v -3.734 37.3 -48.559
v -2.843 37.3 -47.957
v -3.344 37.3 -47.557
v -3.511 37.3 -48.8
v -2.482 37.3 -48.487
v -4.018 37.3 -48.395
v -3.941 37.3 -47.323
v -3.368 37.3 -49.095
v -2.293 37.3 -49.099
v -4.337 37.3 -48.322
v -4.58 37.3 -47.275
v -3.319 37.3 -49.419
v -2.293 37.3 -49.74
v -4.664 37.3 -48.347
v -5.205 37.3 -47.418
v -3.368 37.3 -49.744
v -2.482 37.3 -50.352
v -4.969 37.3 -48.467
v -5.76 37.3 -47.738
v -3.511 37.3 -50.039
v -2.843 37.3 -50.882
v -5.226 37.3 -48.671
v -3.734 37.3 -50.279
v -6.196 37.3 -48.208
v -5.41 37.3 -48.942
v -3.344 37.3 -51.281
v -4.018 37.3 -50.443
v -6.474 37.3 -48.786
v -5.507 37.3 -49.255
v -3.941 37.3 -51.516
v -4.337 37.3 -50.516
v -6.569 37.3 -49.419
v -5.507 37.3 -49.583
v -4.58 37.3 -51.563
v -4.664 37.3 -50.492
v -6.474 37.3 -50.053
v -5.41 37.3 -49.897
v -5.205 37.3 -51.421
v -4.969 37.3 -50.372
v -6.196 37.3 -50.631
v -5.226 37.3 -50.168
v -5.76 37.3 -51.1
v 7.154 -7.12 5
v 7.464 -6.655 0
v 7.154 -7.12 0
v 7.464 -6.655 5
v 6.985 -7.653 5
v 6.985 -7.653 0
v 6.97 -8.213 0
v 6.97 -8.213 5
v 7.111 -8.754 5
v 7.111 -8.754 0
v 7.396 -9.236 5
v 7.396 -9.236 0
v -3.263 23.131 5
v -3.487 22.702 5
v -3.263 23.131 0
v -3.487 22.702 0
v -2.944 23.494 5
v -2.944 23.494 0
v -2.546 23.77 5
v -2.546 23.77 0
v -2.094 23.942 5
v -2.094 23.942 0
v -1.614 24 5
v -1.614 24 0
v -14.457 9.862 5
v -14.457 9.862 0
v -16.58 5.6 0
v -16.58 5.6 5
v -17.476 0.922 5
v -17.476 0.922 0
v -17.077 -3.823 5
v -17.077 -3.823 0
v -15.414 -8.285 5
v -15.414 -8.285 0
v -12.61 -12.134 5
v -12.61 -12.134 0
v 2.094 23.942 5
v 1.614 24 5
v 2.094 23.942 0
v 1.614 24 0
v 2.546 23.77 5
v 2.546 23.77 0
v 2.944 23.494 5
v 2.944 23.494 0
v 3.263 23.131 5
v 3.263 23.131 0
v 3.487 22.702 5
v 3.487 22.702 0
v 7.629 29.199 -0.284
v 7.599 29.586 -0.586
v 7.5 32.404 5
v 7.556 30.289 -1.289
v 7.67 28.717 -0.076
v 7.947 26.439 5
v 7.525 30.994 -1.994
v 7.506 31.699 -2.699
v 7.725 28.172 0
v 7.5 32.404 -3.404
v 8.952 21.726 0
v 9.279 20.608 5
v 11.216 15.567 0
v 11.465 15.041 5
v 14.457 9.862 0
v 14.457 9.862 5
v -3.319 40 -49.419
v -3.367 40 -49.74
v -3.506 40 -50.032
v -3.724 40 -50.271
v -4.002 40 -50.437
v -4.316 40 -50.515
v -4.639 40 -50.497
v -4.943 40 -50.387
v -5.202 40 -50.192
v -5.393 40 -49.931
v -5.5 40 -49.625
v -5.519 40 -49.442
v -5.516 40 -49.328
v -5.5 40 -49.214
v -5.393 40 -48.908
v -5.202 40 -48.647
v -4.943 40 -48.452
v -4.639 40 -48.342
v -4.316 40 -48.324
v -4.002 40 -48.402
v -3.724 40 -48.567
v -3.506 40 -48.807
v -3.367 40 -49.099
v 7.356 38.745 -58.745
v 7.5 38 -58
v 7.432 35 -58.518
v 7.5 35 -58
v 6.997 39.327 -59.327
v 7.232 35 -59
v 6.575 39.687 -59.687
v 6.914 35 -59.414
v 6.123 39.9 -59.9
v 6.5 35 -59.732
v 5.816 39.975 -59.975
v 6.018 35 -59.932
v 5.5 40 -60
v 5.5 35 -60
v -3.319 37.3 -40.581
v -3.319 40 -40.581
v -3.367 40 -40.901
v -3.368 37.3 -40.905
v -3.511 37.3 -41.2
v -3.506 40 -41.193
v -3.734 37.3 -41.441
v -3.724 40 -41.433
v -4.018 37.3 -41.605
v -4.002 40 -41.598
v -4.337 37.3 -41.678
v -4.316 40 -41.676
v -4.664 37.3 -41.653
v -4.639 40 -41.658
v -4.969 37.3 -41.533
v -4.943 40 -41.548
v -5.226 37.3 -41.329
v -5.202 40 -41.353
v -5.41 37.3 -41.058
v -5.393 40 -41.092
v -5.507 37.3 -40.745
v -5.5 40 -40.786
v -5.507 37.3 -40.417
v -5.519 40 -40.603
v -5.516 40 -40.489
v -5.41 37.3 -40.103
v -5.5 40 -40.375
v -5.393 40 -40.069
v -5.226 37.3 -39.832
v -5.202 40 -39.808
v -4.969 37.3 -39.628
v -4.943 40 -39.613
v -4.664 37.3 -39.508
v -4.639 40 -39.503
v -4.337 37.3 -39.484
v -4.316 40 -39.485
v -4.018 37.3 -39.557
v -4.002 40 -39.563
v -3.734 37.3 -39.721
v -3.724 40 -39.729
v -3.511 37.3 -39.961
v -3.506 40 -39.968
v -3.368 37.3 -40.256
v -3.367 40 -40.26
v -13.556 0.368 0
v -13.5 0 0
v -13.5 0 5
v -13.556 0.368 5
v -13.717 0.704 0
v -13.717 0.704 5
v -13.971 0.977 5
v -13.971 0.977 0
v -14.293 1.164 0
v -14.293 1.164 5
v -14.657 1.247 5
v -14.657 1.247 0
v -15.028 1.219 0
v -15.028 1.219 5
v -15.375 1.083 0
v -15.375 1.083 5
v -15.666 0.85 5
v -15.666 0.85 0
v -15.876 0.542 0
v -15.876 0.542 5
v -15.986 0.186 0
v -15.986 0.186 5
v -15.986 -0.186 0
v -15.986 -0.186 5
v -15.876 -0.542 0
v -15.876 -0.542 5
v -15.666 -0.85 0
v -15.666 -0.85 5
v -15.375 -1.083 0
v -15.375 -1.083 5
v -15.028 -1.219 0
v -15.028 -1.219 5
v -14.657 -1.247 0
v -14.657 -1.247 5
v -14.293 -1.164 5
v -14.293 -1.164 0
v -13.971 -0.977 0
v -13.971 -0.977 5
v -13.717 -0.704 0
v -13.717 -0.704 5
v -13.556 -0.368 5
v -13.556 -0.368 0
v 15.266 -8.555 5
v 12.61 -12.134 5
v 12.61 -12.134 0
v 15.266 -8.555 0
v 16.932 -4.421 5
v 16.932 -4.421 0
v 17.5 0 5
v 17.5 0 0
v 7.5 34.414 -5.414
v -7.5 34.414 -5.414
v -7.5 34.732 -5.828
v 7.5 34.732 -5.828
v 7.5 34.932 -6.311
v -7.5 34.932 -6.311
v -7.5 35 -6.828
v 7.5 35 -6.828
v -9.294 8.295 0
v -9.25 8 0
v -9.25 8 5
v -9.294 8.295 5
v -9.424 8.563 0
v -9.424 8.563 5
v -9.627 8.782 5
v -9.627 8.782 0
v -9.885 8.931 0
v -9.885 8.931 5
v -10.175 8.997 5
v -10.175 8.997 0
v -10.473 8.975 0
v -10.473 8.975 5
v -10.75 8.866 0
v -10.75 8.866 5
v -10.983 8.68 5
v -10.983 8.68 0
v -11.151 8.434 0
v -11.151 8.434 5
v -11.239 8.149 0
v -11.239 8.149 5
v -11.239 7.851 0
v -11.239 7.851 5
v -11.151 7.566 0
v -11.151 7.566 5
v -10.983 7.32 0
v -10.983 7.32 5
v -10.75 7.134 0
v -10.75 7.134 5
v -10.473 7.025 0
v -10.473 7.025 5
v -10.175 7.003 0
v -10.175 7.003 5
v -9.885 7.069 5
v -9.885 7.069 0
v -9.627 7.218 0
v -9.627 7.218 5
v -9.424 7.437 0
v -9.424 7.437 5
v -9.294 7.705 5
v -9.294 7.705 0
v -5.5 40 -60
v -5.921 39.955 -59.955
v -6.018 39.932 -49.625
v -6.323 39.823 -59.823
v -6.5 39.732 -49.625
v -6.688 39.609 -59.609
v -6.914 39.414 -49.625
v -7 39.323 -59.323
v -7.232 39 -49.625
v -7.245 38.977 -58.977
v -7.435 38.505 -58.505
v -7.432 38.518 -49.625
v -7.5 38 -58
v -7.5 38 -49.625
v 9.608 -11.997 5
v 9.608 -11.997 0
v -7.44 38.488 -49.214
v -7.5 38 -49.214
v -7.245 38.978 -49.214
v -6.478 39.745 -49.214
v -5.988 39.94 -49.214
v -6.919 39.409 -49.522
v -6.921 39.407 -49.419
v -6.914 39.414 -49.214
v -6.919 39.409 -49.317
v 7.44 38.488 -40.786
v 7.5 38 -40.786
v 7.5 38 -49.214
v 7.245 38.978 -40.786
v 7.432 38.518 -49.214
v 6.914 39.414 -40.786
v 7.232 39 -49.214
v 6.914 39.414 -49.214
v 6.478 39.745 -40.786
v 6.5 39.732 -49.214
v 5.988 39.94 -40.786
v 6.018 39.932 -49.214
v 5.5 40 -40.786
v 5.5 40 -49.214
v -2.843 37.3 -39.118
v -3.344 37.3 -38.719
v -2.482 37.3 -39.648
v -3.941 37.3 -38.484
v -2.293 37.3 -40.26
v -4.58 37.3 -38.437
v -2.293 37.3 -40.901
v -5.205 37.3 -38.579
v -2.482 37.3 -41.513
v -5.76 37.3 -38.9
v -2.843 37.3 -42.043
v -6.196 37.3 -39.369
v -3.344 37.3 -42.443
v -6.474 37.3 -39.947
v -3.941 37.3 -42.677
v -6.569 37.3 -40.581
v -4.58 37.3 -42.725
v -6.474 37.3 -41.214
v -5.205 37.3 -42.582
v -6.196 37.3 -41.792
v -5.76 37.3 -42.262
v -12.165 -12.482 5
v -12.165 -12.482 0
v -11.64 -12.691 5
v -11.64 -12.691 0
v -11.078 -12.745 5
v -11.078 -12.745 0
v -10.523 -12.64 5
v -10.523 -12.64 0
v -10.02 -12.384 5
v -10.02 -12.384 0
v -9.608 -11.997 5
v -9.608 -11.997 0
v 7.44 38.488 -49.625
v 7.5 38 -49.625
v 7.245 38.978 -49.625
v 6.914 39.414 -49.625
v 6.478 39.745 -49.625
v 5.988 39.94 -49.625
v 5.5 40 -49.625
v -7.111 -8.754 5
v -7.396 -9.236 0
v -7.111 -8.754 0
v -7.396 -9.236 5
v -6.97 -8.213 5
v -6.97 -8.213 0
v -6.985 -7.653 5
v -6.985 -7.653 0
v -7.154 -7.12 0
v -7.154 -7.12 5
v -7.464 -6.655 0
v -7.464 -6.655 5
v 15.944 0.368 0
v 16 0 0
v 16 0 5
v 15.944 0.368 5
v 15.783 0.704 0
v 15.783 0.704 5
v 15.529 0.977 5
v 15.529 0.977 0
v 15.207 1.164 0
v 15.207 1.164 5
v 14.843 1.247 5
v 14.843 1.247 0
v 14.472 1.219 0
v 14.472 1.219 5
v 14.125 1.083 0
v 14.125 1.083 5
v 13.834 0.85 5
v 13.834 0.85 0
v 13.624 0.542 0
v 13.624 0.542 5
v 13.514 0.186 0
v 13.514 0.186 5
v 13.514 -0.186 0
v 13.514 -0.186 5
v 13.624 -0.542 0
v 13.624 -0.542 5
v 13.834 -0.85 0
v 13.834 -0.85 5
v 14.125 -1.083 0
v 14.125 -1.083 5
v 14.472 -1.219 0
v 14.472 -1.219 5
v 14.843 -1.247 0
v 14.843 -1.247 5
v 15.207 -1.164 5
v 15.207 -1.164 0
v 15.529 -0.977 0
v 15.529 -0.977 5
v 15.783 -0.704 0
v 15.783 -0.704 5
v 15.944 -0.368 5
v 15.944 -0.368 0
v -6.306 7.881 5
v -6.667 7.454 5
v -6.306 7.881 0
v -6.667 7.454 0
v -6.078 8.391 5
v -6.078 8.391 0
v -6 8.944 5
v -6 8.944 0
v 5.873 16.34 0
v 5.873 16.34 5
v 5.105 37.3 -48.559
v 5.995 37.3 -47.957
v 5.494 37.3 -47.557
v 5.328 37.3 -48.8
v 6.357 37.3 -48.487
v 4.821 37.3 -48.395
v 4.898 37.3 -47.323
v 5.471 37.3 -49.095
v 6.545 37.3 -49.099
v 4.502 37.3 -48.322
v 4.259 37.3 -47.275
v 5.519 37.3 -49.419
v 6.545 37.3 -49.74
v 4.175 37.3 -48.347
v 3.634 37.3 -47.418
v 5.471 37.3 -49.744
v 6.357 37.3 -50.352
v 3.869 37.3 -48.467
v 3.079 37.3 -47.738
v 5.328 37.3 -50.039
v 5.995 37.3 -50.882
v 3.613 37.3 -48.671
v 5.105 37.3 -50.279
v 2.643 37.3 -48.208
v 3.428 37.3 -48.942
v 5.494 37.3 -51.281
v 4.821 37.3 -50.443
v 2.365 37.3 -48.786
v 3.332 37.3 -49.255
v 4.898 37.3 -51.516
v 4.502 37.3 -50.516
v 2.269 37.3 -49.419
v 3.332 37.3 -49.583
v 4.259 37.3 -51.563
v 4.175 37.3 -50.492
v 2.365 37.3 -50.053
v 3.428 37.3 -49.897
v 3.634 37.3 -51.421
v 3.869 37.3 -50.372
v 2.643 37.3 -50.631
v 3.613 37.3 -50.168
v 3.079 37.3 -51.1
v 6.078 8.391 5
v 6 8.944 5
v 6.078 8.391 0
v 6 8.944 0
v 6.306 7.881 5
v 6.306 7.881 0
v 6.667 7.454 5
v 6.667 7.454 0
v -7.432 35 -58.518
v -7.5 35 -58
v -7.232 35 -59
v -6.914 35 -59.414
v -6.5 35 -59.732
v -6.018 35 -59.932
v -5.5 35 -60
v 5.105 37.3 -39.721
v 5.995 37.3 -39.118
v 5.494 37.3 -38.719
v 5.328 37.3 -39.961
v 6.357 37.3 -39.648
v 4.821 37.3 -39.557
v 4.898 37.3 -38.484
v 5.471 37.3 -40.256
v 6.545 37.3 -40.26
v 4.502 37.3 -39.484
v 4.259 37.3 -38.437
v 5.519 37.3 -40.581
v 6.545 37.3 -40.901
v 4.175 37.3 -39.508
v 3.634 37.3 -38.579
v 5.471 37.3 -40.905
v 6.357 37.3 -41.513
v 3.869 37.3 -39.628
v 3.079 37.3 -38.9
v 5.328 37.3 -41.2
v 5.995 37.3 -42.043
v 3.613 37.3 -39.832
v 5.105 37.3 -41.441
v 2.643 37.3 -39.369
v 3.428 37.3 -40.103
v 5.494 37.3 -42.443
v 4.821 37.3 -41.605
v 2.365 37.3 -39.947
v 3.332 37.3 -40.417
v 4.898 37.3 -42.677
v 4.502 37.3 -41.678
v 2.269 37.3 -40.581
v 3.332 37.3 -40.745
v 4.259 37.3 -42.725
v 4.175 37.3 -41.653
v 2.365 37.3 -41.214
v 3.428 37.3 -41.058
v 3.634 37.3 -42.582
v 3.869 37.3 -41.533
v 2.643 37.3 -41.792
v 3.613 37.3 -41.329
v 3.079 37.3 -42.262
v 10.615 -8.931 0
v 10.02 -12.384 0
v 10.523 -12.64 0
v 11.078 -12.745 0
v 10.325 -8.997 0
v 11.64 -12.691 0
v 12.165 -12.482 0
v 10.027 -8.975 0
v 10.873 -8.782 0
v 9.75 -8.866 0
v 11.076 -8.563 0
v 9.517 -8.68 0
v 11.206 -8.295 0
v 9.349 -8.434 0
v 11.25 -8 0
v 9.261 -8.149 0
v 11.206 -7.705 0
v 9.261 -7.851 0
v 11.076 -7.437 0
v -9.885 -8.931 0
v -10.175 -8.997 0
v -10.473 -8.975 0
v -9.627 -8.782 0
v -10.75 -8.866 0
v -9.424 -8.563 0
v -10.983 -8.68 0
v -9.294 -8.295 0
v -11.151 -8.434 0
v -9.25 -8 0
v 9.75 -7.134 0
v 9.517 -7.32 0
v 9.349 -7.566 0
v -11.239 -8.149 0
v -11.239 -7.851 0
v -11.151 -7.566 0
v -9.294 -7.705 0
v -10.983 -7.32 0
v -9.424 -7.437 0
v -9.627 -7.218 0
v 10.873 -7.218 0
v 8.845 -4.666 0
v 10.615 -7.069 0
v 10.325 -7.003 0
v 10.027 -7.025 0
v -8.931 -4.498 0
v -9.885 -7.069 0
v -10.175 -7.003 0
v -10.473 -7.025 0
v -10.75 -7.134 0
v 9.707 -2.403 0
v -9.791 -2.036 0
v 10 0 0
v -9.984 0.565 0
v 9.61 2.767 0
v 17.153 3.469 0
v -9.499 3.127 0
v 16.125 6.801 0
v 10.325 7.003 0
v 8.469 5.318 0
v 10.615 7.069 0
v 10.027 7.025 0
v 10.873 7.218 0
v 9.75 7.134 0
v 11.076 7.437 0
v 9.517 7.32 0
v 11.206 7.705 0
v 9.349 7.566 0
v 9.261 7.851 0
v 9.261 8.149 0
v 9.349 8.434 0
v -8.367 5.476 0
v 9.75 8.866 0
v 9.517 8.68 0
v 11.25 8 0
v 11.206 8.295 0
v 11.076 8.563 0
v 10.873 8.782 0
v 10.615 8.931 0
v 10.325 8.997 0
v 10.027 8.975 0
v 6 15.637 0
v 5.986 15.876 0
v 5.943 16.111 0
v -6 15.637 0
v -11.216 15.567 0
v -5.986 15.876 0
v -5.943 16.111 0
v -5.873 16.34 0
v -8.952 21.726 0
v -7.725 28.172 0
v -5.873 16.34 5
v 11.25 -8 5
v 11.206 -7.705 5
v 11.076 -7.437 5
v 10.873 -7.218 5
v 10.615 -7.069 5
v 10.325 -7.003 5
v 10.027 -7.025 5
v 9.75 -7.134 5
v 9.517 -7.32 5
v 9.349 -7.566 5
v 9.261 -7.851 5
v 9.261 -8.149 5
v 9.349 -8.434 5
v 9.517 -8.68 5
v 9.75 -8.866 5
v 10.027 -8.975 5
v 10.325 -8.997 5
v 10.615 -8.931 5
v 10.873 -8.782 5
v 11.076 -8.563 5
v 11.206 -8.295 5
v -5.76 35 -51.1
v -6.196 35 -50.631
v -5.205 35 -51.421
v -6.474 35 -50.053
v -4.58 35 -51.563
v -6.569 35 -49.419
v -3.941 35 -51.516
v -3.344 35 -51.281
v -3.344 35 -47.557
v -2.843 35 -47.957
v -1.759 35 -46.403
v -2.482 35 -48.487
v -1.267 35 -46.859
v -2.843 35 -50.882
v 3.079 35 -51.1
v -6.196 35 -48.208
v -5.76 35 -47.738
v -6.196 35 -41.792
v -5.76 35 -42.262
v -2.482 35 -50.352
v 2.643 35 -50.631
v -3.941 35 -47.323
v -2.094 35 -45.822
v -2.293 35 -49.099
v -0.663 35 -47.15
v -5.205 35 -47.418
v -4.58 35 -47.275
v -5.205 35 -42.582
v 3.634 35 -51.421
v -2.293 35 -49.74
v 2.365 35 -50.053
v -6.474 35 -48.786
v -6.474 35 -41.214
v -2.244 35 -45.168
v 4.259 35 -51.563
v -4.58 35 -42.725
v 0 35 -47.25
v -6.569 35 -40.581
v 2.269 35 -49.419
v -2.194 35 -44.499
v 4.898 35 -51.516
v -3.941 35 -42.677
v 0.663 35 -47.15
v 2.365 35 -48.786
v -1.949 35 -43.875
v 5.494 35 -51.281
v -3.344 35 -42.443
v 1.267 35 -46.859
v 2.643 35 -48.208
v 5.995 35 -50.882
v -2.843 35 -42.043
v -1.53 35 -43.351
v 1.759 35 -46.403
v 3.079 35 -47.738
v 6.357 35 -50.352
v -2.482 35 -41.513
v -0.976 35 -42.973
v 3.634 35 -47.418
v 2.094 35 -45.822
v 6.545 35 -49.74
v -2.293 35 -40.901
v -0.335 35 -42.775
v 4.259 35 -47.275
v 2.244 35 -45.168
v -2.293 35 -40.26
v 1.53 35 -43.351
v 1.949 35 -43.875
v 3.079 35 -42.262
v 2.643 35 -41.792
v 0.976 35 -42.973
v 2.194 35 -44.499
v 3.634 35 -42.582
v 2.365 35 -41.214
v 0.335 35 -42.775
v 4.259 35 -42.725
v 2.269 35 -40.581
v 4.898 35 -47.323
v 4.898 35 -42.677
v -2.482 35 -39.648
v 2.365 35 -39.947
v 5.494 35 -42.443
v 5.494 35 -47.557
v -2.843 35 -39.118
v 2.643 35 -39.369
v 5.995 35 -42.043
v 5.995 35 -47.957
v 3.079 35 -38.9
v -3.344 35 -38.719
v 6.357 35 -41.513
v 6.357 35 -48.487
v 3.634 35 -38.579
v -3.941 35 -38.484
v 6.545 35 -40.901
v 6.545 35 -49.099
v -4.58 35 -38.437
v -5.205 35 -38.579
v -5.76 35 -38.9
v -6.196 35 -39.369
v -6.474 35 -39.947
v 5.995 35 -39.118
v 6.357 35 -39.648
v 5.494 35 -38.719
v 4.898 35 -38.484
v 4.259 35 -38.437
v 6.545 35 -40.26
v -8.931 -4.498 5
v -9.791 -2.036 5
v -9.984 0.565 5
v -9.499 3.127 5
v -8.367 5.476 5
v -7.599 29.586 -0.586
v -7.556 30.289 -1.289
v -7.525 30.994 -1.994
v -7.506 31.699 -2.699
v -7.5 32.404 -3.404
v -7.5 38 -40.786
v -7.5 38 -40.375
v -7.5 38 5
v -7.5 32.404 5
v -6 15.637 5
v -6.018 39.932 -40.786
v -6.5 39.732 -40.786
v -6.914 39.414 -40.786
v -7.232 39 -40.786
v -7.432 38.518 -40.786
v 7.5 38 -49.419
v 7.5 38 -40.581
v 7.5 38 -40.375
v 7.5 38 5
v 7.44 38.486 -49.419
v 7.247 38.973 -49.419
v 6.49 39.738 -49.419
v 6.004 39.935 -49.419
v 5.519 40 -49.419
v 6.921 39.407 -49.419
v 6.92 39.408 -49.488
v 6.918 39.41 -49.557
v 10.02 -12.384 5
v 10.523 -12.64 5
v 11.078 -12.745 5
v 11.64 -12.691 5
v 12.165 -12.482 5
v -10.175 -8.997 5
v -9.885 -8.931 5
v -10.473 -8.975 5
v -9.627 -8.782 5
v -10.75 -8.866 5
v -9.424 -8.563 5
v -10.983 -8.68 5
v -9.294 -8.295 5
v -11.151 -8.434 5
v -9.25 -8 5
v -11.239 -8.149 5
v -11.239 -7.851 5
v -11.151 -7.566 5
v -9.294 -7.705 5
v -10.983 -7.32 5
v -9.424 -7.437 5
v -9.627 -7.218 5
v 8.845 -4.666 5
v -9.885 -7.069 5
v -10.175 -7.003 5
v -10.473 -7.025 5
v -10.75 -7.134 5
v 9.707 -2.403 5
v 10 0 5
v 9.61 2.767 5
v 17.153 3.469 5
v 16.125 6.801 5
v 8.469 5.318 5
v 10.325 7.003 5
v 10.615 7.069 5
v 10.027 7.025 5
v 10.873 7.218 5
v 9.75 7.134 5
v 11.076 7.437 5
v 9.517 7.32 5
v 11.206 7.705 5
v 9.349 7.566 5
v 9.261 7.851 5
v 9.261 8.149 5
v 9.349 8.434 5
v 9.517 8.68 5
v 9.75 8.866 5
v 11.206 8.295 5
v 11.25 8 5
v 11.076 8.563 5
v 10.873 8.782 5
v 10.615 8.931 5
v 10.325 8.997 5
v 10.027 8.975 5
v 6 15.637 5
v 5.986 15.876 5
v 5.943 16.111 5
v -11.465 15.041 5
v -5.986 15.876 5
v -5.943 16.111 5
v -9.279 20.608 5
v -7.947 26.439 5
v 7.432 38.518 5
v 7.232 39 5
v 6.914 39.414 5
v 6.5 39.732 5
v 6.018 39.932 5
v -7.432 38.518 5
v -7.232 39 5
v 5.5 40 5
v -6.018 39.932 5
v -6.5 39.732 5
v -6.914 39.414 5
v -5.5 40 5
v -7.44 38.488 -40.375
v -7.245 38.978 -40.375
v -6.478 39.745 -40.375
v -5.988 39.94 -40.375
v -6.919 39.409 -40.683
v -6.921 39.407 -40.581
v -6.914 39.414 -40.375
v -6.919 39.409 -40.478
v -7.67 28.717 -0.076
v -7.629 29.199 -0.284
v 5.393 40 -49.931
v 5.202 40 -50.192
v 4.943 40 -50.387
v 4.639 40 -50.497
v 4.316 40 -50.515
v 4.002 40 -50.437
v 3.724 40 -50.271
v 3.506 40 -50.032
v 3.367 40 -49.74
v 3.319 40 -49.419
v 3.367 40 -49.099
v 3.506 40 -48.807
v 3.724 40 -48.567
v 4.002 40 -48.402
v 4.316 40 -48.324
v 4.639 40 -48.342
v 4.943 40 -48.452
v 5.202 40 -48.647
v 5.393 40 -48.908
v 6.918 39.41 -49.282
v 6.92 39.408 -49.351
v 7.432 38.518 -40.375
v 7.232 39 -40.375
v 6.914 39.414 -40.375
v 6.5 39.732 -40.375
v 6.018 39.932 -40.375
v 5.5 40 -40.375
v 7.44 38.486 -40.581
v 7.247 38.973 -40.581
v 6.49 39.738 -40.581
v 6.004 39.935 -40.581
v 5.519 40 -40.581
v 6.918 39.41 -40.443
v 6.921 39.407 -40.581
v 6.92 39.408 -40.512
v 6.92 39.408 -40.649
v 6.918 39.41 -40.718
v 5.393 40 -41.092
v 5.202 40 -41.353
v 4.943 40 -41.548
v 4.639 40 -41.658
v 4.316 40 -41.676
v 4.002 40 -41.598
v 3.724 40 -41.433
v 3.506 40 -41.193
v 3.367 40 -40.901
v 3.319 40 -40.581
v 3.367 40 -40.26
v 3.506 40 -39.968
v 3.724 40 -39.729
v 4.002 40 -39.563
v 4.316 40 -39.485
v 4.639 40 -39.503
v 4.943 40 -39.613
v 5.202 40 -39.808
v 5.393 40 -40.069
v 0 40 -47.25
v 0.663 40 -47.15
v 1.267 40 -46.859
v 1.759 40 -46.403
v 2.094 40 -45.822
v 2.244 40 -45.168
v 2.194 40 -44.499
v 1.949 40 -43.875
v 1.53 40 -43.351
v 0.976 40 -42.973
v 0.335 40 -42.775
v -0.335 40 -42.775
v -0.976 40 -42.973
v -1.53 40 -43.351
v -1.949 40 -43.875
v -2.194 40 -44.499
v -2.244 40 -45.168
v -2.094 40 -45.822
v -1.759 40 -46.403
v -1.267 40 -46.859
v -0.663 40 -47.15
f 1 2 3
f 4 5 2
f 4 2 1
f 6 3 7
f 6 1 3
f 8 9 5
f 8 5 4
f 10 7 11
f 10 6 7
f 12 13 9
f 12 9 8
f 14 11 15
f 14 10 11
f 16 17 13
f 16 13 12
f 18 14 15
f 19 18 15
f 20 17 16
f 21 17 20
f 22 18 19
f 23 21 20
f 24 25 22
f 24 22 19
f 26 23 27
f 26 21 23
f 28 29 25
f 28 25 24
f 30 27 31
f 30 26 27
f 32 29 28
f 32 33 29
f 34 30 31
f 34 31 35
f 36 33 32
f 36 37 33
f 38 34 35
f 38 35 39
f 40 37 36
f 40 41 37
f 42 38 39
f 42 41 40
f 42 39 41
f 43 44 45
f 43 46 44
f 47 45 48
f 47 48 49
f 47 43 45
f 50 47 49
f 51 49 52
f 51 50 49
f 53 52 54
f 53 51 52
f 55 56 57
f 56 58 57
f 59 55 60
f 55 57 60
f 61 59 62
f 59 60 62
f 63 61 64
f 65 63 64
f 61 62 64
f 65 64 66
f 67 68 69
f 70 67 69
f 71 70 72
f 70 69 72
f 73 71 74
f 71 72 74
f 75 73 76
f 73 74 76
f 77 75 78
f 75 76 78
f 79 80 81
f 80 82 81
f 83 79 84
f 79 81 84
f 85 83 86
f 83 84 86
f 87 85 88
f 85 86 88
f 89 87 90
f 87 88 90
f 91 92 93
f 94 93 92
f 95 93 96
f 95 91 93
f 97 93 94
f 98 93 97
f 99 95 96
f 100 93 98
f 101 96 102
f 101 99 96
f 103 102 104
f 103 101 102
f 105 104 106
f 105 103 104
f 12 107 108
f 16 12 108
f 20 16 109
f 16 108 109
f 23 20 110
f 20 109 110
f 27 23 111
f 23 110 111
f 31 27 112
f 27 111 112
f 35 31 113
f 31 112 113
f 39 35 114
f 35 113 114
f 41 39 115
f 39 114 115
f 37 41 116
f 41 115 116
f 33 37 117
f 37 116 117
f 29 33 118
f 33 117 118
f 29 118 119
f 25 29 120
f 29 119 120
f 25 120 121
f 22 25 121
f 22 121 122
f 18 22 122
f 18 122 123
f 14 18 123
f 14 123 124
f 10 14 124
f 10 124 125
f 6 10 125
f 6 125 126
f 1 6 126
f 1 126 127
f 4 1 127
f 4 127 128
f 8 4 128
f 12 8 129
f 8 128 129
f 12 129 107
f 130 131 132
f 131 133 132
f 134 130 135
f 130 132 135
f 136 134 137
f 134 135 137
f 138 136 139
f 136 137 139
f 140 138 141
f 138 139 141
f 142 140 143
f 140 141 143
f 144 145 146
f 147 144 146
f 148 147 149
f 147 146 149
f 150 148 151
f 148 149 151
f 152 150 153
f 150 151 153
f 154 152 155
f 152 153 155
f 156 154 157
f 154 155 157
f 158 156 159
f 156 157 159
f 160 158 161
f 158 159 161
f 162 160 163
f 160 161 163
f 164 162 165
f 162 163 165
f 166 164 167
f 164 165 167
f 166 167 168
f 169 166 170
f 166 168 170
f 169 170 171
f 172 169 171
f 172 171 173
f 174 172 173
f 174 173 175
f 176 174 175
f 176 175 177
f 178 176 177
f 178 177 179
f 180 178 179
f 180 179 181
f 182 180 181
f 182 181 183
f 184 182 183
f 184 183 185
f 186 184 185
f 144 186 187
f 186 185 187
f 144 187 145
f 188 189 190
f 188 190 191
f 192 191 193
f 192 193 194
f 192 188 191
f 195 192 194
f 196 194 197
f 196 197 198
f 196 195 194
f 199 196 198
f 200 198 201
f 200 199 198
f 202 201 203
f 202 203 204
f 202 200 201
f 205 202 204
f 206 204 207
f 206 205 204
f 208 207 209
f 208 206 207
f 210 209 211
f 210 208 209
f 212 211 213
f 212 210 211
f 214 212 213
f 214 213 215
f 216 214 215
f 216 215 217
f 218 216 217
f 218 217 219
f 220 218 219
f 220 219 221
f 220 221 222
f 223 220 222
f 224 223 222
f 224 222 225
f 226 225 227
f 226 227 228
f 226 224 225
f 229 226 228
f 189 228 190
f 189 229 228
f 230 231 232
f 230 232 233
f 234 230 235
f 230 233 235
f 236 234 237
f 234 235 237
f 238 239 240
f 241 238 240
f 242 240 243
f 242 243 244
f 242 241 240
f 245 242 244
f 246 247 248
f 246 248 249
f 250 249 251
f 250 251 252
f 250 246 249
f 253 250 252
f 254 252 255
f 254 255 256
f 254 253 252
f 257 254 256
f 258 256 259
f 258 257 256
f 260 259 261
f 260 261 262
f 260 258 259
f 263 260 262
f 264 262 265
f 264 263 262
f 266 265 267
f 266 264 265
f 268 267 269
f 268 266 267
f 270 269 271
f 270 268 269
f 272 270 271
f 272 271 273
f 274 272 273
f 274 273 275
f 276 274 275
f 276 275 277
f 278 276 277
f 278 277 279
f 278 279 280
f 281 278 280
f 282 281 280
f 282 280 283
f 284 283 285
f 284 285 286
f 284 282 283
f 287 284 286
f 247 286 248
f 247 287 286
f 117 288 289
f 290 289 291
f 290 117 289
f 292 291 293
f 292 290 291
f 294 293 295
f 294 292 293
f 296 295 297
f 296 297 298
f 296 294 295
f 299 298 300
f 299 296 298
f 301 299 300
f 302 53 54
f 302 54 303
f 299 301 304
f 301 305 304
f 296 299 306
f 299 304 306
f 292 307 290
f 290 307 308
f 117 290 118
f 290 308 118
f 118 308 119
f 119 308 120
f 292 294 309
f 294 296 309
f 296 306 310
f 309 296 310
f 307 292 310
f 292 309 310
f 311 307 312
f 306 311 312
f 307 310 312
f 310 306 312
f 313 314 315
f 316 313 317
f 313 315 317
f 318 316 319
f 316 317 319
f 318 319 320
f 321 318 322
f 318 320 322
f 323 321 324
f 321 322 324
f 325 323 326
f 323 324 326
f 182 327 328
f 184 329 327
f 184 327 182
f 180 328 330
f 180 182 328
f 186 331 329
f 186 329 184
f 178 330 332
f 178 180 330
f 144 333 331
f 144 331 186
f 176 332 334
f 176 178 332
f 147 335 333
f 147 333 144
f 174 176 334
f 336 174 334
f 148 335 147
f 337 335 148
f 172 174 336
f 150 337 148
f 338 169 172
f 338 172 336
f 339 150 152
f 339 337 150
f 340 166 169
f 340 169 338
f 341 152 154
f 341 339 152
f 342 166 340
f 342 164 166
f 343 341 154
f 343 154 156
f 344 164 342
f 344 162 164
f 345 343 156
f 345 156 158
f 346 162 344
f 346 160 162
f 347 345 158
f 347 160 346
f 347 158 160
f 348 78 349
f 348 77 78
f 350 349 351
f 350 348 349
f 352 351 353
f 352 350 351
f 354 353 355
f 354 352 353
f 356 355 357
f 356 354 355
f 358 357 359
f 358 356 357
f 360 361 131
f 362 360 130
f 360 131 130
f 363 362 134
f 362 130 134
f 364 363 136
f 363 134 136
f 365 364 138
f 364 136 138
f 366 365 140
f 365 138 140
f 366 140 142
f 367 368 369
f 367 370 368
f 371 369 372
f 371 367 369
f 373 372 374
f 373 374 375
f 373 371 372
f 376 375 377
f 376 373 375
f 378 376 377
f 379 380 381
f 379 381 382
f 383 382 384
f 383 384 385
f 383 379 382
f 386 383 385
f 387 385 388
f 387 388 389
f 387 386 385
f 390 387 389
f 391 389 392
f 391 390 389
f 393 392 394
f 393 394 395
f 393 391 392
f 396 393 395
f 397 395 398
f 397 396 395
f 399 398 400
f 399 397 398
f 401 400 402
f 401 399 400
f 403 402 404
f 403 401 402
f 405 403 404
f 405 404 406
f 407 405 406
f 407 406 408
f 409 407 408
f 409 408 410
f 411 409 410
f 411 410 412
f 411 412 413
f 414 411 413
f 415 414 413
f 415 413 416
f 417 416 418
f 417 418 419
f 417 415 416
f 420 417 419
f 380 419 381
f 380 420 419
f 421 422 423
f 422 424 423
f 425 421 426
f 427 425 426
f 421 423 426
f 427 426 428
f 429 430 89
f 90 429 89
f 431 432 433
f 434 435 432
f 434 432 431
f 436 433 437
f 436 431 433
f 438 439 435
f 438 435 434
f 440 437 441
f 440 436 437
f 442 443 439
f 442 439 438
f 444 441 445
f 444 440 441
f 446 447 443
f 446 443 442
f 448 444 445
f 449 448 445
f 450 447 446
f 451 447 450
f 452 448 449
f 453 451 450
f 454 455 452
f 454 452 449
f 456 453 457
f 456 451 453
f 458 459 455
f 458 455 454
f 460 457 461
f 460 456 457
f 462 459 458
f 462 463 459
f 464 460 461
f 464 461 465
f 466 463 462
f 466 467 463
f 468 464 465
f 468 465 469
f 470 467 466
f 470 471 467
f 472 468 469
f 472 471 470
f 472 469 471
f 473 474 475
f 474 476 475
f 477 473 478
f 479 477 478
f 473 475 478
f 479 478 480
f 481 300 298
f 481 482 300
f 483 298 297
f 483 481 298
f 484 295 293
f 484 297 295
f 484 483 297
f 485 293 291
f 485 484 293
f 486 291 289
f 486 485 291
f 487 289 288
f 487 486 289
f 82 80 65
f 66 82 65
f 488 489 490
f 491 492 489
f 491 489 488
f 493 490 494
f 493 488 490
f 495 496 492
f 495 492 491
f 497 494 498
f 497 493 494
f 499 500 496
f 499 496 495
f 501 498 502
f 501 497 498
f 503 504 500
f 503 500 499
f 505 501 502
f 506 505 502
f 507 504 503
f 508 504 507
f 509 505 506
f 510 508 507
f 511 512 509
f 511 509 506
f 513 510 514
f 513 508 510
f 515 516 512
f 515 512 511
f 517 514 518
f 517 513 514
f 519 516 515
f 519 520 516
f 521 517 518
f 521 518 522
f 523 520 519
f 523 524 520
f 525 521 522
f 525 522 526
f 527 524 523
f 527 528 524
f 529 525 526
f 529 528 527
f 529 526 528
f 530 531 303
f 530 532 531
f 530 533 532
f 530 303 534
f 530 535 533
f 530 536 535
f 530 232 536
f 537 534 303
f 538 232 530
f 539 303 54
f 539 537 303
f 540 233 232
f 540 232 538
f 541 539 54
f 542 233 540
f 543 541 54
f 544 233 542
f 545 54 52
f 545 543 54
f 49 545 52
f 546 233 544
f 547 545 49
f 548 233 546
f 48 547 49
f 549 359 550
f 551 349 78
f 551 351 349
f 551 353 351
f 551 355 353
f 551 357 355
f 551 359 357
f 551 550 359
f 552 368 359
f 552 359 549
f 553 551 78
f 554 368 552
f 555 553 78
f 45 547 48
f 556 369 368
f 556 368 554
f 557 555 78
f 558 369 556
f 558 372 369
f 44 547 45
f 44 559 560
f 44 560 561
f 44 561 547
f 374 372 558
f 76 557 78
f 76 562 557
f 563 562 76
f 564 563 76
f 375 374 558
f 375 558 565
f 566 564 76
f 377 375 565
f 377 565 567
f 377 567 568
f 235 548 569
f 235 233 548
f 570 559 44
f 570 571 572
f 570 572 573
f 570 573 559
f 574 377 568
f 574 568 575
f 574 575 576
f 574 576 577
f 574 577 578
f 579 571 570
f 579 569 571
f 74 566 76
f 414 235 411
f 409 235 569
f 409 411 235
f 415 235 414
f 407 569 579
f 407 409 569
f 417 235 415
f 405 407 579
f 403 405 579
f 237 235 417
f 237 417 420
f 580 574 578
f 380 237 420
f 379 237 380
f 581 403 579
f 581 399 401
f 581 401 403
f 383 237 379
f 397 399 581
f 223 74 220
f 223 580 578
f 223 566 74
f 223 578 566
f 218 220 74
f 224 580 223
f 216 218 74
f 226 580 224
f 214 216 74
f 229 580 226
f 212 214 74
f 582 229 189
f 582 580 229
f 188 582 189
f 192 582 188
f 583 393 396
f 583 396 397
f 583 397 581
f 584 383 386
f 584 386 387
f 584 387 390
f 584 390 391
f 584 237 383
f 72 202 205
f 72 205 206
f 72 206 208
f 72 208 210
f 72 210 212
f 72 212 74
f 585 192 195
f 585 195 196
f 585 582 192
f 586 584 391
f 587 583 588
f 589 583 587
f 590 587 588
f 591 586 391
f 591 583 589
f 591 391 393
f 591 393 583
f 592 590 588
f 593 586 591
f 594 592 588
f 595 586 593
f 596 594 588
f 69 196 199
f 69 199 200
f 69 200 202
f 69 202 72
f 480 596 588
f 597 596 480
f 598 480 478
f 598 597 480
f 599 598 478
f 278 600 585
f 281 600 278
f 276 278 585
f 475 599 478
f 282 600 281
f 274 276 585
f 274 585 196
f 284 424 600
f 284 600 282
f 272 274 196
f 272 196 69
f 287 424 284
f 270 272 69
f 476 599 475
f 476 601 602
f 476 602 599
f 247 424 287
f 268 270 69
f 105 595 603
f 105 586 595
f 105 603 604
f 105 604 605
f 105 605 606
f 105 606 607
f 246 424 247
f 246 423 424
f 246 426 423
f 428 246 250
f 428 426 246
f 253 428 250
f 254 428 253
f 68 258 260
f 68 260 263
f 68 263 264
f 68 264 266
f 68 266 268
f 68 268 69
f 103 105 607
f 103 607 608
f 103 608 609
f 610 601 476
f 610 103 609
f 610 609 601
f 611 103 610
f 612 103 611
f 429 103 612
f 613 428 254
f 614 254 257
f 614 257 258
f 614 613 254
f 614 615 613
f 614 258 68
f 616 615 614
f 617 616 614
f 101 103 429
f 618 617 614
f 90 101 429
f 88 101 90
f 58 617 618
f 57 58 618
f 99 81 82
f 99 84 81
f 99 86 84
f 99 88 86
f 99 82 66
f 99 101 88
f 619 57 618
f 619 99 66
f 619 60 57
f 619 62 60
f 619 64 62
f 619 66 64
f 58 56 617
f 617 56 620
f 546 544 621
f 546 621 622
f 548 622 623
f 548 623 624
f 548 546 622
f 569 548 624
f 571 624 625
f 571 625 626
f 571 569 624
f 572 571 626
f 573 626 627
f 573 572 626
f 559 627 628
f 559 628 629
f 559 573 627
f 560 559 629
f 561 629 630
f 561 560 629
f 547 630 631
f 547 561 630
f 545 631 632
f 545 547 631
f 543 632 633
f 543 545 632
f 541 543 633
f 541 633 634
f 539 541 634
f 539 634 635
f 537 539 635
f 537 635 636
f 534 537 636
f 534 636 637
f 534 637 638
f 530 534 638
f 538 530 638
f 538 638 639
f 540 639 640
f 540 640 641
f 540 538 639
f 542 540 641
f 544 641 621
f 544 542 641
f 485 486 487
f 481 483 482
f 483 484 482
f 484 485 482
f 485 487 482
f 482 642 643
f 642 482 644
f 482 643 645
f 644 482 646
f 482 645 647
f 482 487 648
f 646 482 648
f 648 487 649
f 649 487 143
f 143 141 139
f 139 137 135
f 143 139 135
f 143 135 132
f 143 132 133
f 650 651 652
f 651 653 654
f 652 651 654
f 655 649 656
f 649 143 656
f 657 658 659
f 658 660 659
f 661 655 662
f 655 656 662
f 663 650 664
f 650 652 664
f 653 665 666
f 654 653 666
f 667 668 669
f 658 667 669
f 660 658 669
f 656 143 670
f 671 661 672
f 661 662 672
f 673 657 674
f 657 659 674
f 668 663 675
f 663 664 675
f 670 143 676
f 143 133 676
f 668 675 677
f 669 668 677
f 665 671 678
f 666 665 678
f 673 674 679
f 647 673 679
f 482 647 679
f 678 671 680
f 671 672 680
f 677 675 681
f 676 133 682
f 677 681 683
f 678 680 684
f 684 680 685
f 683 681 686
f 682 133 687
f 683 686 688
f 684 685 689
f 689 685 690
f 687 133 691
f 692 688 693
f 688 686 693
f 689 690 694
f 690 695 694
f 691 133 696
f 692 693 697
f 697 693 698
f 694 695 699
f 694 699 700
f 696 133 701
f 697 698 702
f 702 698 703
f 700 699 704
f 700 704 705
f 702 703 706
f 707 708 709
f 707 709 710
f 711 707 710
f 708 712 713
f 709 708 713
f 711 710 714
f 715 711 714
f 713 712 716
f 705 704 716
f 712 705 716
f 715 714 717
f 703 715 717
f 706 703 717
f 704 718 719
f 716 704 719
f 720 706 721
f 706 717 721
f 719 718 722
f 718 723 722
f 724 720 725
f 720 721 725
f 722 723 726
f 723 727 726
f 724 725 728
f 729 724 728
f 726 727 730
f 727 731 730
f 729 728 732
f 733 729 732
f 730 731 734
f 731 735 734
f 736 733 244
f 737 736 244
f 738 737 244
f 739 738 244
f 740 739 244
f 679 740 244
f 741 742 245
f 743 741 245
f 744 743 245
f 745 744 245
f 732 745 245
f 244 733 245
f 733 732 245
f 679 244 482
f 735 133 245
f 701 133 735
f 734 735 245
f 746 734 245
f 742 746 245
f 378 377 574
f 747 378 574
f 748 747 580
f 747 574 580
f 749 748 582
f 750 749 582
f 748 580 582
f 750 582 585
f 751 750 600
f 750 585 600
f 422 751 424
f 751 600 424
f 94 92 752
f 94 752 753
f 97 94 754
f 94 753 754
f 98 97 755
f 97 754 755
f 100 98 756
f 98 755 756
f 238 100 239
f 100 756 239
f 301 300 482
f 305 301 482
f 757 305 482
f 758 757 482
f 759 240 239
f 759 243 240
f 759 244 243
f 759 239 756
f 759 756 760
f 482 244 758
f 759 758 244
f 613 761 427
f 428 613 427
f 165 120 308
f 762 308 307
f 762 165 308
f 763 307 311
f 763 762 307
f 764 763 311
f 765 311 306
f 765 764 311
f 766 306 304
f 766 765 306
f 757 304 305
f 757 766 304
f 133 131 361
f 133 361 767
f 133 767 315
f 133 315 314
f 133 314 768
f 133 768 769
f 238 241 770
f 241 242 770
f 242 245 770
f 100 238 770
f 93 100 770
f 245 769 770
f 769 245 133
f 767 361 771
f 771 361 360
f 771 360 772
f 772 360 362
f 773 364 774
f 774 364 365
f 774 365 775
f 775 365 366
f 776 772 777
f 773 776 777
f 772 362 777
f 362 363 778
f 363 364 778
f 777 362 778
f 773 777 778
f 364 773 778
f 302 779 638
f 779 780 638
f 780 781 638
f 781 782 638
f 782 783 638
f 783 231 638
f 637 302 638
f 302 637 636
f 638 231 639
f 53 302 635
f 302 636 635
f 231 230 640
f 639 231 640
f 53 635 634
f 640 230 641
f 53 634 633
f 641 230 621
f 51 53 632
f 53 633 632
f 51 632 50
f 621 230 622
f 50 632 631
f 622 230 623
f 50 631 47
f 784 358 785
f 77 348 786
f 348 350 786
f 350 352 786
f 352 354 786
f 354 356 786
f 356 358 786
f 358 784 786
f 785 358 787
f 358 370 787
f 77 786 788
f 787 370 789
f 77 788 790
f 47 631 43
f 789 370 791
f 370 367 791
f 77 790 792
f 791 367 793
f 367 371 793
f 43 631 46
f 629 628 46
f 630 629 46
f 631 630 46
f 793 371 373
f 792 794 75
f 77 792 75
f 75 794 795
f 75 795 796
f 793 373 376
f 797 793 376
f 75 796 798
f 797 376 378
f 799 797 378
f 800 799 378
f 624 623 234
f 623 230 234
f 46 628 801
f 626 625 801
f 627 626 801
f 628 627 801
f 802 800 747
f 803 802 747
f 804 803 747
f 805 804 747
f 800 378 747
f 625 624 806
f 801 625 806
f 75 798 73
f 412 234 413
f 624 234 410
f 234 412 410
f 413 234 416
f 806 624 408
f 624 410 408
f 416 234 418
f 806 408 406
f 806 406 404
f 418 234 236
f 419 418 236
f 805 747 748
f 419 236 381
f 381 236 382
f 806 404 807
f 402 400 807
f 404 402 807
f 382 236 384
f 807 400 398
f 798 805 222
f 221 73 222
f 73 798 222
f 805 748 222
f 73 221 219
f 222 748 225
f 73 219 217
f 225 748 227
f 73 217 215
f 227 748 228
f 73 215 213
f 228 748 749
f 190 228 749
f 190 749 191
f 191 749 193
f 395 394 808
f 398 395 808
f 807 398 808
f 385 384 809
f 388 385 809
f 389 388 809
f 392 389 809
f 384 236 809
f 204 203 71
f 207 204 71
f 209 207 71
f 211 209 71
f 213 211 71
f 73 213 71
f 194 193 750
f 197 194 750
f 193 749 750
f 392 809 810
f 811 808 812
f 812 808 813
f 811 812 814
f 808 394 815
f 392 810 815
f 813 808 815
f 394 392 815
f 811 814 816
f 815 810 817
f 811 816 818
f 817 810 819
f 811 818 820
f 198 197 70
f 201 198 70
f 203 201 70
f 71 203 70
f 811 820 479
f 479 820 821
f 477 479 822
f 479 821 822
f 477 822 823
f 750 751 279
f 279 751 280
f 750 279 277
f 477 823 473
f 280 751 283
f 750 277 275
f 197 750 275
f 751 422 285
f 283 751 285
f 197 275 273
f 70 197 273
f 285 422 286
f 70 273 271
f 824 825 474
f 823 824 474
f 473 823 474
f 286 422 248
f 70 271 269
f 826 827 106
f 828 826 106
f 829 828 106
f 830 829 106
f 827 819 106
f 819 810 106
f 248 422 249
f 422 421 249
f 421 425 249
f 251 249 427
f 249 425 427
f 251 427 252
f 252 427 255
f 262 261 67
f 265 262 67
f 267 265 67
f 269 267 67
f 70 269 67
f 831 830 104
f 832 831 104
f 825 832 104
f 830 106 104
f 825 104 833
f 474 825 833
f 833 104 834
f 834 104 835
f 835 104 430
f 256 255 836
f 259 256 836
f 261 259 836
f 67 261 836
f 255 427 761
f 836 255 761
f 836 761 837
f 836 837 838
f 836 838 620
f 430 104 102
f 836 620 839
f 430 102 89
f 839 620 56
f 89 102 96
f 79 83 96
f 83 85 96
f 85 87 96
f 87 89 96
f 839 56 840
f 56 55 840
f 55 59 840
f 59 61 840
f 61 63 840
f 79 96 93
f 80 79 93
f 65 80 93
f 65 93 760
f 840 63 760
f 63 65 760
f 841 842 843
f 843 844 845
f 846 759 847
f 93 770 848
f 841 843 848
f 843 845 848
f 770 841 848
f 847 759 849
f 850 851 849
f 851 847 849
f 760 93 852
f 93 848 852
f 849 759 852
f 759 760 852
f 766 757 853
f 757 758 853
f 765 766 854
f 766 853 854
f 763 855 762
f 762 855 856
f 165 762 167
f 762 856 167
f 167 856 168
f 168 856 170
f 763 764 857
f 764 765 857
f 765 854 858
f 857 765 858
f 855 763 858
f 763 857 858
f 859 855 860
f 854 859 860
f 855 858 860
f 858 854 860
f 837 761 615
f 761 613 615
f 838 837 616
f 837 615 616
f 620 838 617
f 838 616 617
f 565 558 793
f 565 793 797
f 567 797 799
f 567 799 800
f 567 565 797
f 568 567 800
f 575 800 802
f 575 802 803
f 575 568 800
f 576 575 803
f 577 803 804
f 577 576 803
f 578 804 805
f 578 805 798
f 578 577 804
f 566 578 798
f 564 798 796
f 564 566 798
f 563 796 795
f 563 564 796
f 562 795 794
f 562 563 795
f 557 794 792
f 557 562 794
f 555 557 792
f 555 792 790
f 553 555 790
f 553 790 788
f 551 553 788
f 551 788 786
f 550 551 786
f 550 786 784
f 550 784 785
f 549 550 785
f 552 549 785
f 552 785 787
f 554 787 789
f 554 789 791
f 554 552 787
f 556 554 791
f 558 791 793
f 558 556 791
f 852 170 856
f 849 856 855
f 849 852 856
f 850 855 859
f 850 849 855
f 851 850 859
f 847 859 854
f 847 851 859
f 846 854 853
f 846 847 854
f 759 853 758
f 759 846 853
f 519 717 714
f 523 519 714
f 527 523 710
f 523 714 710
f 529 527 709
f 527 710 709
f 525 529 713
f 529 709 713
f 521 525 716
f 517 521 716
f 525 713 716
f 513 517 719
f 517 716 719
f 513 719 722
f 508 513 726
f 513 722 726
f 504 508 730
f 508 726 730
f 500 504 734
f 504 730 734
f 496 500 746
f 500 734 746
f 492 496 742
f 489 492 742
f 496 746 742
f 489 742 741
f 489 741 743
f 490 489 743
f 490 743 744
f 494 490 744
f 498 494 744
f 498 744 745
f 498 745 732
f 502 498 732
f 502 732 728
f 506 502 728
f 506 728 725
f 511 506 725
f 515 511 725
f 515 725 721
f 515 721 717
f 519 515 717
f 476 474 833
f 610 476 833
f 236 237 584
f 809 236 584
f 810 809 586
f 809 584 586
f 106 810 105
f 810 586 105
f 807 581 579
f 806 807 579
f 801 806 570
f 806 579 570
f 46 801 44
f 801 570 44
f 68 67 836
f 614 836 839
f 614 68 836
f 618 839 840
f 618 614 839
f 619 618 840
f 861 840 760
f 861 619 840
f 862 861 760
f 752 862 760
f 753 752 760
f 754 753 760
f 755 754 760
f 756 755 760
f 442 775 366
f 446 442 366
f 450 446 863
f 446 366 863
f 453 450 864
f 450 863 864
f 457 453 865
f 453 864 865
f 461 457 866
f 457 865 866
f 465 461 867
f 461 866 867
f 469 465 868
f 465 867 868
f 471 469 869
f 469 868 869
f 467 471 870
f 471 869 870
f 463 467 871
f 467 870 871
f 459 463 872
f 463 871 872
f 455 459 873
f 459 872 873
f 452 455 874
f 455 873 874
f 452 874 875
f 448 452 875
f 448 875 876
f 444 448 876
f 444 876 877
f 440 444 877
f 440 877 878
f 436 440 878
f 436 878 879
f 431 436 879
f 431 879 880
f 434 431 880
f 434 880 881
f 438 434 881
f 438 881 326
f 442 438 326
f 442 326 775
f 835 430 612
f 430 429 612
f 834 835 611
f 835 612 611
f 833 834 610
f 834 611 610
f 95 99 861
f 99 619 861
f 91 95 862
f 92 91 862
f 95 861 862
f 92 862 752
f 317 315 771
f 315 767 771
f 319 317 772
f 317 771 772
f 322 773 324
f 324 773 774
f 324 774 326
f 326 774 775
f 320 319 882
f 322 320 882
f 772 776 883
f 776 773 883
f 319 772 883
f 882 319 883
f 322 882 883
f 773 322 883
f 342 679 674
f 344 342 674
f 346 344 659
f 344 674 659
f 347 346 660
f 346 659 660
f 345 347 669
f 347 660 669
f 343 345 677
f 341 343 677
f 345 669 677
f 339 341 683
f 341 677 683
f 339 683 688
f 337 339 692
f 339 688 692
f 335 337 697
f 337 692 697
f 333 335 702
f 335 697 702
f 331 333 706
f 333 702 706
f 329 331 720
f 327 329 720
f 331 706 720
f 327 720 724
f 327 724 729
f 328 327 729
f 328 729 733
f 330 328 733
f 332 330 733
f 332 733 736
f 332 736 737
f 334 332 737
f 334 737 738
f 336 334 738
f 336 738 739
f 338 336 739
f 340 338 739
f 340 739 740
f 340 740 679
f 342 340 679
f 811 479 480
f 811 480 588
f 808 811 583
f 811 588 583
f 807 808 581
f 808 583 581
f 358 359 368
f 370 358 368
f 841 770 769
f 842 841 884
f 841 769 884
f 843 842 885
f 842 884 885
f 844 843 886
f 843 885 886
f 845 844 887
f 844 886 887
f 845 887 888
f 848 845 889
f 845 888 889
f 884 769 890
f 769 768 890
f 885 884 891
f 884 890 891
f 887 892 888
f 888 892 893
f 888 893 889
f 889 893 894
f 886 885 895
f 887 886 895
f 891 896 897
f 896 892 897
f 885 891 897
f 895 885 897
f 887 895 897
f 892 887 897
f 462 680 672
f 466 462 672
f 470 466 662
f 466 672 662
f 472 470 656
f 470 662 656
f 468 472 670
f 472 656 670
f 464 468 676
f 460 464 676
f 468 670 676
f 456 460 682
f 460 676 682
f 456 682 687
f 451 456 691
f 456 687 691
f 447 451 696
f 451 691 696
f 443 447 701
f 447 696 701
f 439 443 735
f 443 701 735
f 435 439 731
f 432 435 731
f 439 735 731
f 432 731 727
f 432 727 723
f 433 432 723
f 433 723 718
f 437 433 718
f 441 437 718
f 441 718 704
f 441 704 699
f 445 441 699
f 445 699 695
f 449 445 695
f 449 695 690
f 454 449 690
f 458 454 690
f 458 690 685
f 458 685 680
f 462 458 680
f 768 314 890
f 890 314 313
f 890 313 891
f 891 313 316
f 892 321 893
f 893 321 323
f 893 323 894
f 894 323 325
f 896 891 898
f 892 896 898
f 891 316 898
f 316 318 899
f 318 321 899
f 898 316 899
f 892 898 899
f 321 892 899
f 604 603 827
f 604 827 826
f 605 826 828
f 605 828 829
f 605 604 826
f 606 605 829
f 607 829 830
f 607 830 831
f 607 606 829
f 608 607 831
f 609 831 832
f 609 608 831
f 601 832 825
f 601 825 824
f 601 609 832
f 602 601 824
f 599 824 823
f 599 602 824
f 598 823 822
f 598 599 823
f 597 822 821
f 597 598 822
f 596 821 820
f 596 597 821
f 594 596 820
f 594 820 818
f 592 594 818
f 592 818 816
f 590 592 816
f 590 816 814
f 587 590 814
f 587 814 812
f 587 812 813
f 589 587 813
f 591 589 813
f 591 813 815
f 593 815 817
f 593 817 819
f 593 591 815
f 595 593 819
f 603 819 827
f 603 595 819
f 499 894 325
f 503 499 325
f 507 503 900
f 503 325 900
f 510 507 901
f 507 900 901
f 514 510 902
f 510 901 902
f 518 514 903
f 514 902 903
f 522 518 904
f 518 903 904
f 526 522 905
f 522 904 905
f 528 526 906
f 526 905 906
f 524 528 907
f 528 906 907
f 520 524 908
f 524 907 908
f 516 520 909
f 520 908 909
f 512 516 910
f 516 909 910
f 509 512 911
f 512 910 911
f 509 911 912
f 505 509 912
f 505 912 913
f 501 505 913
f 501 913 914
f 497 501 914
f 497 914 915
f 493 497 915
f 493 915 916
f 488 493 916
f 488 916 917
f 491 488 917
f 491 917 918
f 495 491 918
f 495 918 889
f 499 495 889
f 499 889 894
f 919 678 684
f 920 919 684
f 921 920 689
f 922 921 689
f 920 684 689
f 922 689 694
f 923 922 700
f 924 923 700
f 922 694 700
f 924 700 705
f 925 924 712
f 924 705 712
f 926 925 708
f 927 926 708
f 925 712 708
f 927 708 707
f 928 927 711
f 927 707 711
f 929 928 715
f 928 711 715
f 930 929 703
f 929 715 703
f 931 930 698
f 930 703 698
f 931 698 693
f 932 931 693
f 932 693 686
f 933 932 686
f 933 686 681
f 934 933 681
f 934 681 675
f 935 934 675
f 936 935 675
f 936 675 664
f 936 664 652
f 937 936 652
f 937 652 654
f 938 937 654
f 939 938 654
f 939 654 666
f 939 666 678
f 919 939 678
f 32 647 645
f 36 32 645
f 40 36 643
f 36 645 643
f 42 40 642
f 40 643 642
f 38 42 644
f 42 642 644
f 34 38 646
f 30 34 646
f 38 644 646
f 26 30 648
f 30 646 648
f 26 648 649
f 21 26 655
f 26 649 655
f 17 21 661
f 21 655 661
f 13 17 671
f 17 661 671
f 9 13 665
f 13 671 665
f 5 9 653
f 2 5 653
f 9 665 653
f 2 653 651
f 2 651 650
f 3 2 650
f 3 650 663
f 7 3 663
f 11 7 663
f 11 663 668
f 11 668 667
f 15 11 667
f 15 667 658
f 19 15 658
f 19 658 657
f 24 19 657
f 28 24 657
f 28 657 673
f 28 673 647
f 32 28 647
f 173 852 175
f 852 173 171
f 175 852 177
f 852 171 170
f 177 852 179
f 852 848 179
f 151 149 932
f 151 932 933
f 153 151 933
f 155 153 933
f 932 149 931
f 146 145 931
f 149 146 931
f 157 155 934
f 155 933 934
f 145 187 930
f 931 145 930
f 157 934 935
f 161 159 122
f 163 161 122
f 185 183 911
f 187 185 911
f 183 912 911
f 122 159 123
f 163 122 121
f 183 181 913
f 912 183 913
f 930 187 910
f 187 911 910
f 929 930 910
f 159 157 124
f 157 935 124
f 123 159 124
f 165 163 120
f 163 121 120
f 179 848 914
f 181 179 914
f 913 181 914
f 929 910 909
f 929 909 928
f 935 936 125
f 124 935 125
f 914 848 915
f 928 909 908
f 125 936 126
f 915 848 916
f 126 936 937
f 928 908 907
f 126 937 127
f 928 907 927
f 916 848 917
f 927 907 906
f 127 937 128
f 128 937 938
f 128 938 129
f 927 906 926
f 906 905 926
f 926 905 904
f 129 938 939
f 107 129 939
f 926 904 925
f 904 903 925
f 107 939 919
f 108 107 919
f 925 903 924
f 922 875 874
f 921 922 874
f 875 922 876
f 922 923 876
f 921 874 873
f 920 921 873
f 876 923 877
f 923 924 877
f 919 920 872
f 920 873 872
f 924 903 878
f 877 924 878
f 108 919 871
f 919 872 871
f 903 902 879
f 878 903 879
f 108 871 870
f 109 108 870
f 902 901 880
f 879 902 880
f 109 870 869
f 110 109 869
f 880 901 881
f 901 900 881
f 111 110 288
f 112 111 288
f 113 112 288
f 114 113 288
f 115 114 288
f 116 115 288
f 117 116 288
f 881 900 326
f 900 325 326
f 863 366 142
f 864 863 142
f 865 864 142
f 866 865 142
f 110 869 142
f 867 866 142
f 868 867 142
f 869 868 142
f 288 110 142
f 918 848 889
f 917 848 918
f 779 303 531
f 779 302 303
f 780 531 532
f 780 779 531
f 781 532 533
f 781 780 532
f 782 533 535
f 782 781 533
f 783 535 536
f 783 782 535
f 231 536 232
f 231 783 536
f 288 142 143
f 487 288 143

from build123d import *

# Parameters (mm, degrees)
SKETCH_1_R                   = 1
SKETCH_1_R_2                 = 1.25
EXTRUDE_1_DEPTH              = 5
EXTRUDE_2_DEPTH              = 7.5
SKETCH_5_R                   = 2.25
CUT_EXTRUDE_1_DEPTH          = 15
FILLET_2_R                   = 40
HOLE_WIZARD_M2_1_D           = 2.2
HOLE_WIZARD_M2_1_CBORE_D     = 4.3
HOLE_WIZARD_M2_1_CBORE_DEPTH = 2.3
CUT_EXTRUDE_2_DEPTH          = 79.302298817
FILLET_1_R                   = 2


with BuildPart() as part:
    # 草图1 → 凸台-拉伸1 (new body)
    # profile 1 of 2: a face of its own
    with BuildSketch(Plane.XY):
        with BuildLine():
            ThreePointArc((7.5, 15.811388301), (0, 17.5), (-7.5, 15.811388301))
            ThreePointArc((-7.5, 15.811388301), (-17.382056071, 2.028331029), (-10.939015625, -13.659719512))
            Line((-10.939015625, -13.659719512), (-6.250866071, -7.805554007))
            ThreePointArc((-6.250866071, -7.805554007), (-4.329626963, 9.01411839), (10, 0))
            ThreePointArc((10, 0), (9.01411839, -4.329626963), (6.250866071, -7.805554007))
            Line((6.250866071, -7.805554007), (10.939015625, -13.659719512))
            ThreePointArc((10.939015625, -13.659719512), (15.774707183, -7.576847186), (17.5, 0))
            ThreePointArc((17.5, 0), (14.790199458, 9.354143467), (7.5, 15.811388301))
        make_face()
        with Locations((-10.25, -8)):
            Circle(SKETCH_1_R, mode=Mode.SUBTRACT)
        with Locations((-14.75, 0)):
            Circle(SKETCH_1_R_2, mode=Mode.SUBTRACT)
        with Locations((-10.25, 8)):
            Circle(SKETCH_1_R, mode=Mode.SUBTRACT)
        with Locations((10.25, -8)):
            Circle(SKETCH_1_R, mode=Mode.SUBTRACT)
        with Locations((14.75, 0)):
            Circle(SKETCH_1_R_2, mode=Mode.SUBTRACT)
        with Locations((10.25, 8)):
            Circle(SKETCH_1_R, mode=Mode.SUBTRACT)
    # profile 2 of 2: a face of its own
    with BuildSketch(Plane.XY):
        with BuildLine():
            Line((-7.5, 40), (-7.5, 15.811388301))
            ThreePointArc((-7.5, 15.811388301), (0, 17.5), (7.5, 15.811388301))
            Line((7.5, 15.811388301), (7.5, 40))
            Line((7.5, 40), (-7.5, 40))
        make_face()
    extrude(amount=EXTRUDE_1_DEPTH)

    # 草图3 → 凸台-拉伸2 (add, symmetric)
    with BuildSketch(Plane(origin=(0, 0, 0), x_dir=(0, 0, -1), z_dir=(1, 0, 0))):
        Polygon((0, 40), (60, 40), (60, 35), (6, 35), (0, 29), align=None)
    extrude(amount=EXTRUDE_2_DEPTH, both=True)

    # 草图5 → 切除-拉伸1 (cut)
    with BuildSketch(Plane.XZ.offset(-35)):
        with Locations(Location((0, -45, 0), (0, 0, 270))):
            Circle(SKETCH_5_R)
    extrude(amount=-CUT_EXTRUDE_1_DEPTH, mode=Mode.SUBTRACT)

    # 圆角2
    # the kernel refuses this fillet: 40 mm, written as the material it adds along each edge
    with BuildSketch(Plane(origin=(-7.5, 15.811388301, -41.480787978), x_dir=(-0.759976311594863, -0.6499507718394276, 0), z_dir=(0, 0, 1))) as fillet_2_piece_1_section:
        with BuildLine():
            CenterArc((19.614864399, -38.607797373), FILLET_2_R, 105.160956859, 34.301152757)
            Line((-10.784188065, -12.6097665), (0, 0))
            ThreePointArc((0, 0), (4.576801693, -0.609088649), (9.153603386, 0))
        make_face()
    fillet_2_piece_1 = extrude(amount=46.480787978, mode=Mode.PRIVATE)
    fillet_2_piece_1 = split(fillet_2_piece_1, bisect_by=Plane(origin=(-7.11257259, 31.242526898, 0), z_dir=(0, 0, -1)), keep=Keep.TOP, mode=Mode.PRIVATE)
    fillet_2_piece_1 = split(fillet_2_piece_1, bisect_by=Plane(origin=(-7.11257259, 30.681895174, -1.681895174), z_dir=(0, 0.7071067811865467, 0.7071067811865486)), keep=Keep.TOP, mode=Mode.PRIVATE)
    add(fillet_2_piece_1)
    with BuildSketch(Plane(origin=(-7.5, 15.811388301, 0), x_dir=(-0.7599763115948637, -0.6499507718394266, 0), z_dir=(0, 0, 1))) as fillet_2_piece_2_section:
        with BuildLine():
            CenterArc((19.614864399, -38.607797373), FILLET_2_R, 105.160956859, 34.301152757)
            Line((-10.784188065, -12.6097665), (0, 0))
            ThreePointArc((0, 0), (4.576801693, -0.609088649), (9.153603386, 0))
        make_face()
    fillet_2_piece_2 = extrude(amount=5, mode=Mode.PRIVATE)
    fillet_2_piece_2 = split(fillet_2_piece_2, bisect_by=Plane(origin=(-9.04323472, 22.224032405, 6.775967595), z_dir=(0, -0.7071067811865467, -0.7071067811865486)), keep=Keep.TOP, mode=Mode.PRIVATE)
    add(fillet_2_piece_2)
    with BuildSketch(Plane(origin=(-7.5, 15.811388301, 0), x_dir=(-0.7599763115948637, -0.6499507718394266, 0), z_dir=(0, 0, 1))) as fillet_2_piece_3_section:
        with BuildLine():
            CenterArc((19.614864399, -38.607797373), FILLET_2_R, 105.160956859, 34.301152757)
            Line((-10.784188065, -12.6097665), (0, 0))
            ThreePointArc((0, 0), (4.576801693, -0.609088649), (9.153603386, 0))
        make_face()
    fillet_2_piece_3 = extrude(amount=5, mode=Mode.PRIVATE)
    fillet_2_piece_3 = split(fillet_2_piece_3, bisect_by=Plane(origin=(-7.203009065, 27.482958496, 1.517041504), z_dir=(0, 0.7071067811865467, 0.7071067811865486)), keep=Keep.TOP, mode=Mode.PRIVATE)
    add(fillet_2_piece_3)
    with BuildSketch(Plane(origin=(7.5, 15.811388301, -41.480787978), x_dir=(0.7599763115948623, -0.6499507718394282, 0), z_dir=(0, 0, 1))) as fillet_2_piece_4_section:
        with BuildLine():
            CenterArc((19.614864399, 38.607797373), FILLET_2_R, 220.537890384, 34.301152757)
            Line((-10.784188065, 12.6097665), (0, 0))
            ThreePointArc((0, 0), (4.576801693, 0.609088649), (9.153603386, 0))
        make_face()
    fillet_2_piece_4 = extrude(amount=46.480787978, mode=Mode.PRIVATE)
    fillet_2_piece_4 = split(fillet_2_piece_4, bisect_by=Plane(origin=(7.11257259, 31.242526898, 0), z_dir=(0, 0, -1)), keep=Keep.TOP, mode=Mode.PRIVATE)
    fillet_2_piece_4 = split(fillet_2_piece_4, bisect_by=Plane(origin=(7.11257259, 30.681895174, -1.681895174), z_dir=(0, 0.7071067811865467, 0.7071067811865486)), keep=Keep.TOP, mode=Mode.PRIVATE)
    add(fillet_2_piece_4)
    with BuildSketch(Plane(origin=(7.5, 15.811388301, 0), x_dir=(0.7599763115948623, -0.6499507718394282, 0), z_dir=(0, 0, 1))) as fillet_2_piece_5_section:
        with BuildLine():
            CenterArc((19.614864399, 38.607797373), FILLET_2_R, 220.537890384, 34.301152757)
            Line((-10.784188065, 12.6097665), (0, 0))
            ThreePointArc((0, 0), (4.576801693, 0.609088649), (9.153603386, 0))
        make_face()
    fillet_2_piece_5 = extrude(amount=5, mode=Mode.PRIVATE)
    fillet_2_piece_5 = split(fillet_2_piece_5, bisect_by=Plane(origin=(9.04323472, 22.224032405, 6.775967595), z_dir=(0, -0.7071067811865467, -0.7071067811865486)), keep=Keep.TOP, mode=Mode.PRIVATE)
    add(fillet_2_piece_5)
    with BuildSketch(Plane(origin=(7.5, 15.811388301, 0), x_dir=(0.7599763115948623, -0.6499507718394282, 0), z_dir=(0, 0, 1))) as fillet_2_piece_6_section:
        with BuildLine():
            CenterArc((19.614864399, 38.607797373), FILLET_2_R, 220.537890384, 34.301152757)
            Line((-10.784188065, 12.6097665), (0, 0))
            ThreePointArc((0, 0), (4.576801693, 0.609088649), (9.153603386, 0))
        make_face()
    fillet_2_piece_6 = extrude(amount=5, mode=Mode.PRIVATE)
    fillet_2_piece_6 = split(fillet_2_piece_6, bisect_by=Plane(origin=(7.203009065, 27.482958496, 1.517041504), z_dir=(0, 0.7071067811865467, 0.7071067811865486)), keep=Keep.TOP, mode=Mode.PRIVATE)
    add(fillet_2_piece_6)

    # M2 六角圆柱头螺钉的柱形沉头孔1 (through all)
    with Locations(Plane(origin=(0, 35, 0), x_dir=(-1, 0, 0), z_dir=(0, -1, 0))):
        with Locations((4.419417382, 40.580582618), (-4.419417382, 40.580582618), (-4.419417382, 49.419417382), (4.419417382, 49.419417382)):
            CounterBoreHole(HOLE_WIZARD_M2_1_D / 2, HOLE_WIZARD_M2_1_CBORE_D / 2, HOLE_WIZARD_M2_1_CBORE_DEPTH)

    # 草图9 → 切除-拉伸2 (cut, through all)
    with BuildSketch(Plane.XY.offset(5)):
        Polygon((-3, 24), (-6, 16), (-6, 8), (6, 8), (6, 16), (3, 24), align=None)
    extrude(amount=-CUT_EXTRUDE_2_DEPTH, mode=Mode.SUBTRACT)

    # 圆角1
    fillet_1_edges = [part.edges().sort_by_distance(p)[0] for p in [
        (10.939015625, -13.659719512, 2.5),
        (6.250866071, -7.805554007, 2.5),
        (-6.250866071, -7.805554007, 2.5),
        (-10.939015625, -13.659719512, 2.5),
        (-7.5, 40, -27.5),
        (7.5, 40, -27.5),
        (0, 29, 0),
        (0, 35, -6),
        (-7.5, 37.5, -60),
        (7.5, 37.5, -60),
        (-6, 8, 2.5),
        (6, 8, 2.5),
        (6, 16, 2.5),
        (3, 24, 2.5),
        (-6, 16, 2.5),
        (-3, 24, 2.5),
    ]]
    fillet(fillet_1_edges, radius=FILLET_1_R)


solid = part.part
